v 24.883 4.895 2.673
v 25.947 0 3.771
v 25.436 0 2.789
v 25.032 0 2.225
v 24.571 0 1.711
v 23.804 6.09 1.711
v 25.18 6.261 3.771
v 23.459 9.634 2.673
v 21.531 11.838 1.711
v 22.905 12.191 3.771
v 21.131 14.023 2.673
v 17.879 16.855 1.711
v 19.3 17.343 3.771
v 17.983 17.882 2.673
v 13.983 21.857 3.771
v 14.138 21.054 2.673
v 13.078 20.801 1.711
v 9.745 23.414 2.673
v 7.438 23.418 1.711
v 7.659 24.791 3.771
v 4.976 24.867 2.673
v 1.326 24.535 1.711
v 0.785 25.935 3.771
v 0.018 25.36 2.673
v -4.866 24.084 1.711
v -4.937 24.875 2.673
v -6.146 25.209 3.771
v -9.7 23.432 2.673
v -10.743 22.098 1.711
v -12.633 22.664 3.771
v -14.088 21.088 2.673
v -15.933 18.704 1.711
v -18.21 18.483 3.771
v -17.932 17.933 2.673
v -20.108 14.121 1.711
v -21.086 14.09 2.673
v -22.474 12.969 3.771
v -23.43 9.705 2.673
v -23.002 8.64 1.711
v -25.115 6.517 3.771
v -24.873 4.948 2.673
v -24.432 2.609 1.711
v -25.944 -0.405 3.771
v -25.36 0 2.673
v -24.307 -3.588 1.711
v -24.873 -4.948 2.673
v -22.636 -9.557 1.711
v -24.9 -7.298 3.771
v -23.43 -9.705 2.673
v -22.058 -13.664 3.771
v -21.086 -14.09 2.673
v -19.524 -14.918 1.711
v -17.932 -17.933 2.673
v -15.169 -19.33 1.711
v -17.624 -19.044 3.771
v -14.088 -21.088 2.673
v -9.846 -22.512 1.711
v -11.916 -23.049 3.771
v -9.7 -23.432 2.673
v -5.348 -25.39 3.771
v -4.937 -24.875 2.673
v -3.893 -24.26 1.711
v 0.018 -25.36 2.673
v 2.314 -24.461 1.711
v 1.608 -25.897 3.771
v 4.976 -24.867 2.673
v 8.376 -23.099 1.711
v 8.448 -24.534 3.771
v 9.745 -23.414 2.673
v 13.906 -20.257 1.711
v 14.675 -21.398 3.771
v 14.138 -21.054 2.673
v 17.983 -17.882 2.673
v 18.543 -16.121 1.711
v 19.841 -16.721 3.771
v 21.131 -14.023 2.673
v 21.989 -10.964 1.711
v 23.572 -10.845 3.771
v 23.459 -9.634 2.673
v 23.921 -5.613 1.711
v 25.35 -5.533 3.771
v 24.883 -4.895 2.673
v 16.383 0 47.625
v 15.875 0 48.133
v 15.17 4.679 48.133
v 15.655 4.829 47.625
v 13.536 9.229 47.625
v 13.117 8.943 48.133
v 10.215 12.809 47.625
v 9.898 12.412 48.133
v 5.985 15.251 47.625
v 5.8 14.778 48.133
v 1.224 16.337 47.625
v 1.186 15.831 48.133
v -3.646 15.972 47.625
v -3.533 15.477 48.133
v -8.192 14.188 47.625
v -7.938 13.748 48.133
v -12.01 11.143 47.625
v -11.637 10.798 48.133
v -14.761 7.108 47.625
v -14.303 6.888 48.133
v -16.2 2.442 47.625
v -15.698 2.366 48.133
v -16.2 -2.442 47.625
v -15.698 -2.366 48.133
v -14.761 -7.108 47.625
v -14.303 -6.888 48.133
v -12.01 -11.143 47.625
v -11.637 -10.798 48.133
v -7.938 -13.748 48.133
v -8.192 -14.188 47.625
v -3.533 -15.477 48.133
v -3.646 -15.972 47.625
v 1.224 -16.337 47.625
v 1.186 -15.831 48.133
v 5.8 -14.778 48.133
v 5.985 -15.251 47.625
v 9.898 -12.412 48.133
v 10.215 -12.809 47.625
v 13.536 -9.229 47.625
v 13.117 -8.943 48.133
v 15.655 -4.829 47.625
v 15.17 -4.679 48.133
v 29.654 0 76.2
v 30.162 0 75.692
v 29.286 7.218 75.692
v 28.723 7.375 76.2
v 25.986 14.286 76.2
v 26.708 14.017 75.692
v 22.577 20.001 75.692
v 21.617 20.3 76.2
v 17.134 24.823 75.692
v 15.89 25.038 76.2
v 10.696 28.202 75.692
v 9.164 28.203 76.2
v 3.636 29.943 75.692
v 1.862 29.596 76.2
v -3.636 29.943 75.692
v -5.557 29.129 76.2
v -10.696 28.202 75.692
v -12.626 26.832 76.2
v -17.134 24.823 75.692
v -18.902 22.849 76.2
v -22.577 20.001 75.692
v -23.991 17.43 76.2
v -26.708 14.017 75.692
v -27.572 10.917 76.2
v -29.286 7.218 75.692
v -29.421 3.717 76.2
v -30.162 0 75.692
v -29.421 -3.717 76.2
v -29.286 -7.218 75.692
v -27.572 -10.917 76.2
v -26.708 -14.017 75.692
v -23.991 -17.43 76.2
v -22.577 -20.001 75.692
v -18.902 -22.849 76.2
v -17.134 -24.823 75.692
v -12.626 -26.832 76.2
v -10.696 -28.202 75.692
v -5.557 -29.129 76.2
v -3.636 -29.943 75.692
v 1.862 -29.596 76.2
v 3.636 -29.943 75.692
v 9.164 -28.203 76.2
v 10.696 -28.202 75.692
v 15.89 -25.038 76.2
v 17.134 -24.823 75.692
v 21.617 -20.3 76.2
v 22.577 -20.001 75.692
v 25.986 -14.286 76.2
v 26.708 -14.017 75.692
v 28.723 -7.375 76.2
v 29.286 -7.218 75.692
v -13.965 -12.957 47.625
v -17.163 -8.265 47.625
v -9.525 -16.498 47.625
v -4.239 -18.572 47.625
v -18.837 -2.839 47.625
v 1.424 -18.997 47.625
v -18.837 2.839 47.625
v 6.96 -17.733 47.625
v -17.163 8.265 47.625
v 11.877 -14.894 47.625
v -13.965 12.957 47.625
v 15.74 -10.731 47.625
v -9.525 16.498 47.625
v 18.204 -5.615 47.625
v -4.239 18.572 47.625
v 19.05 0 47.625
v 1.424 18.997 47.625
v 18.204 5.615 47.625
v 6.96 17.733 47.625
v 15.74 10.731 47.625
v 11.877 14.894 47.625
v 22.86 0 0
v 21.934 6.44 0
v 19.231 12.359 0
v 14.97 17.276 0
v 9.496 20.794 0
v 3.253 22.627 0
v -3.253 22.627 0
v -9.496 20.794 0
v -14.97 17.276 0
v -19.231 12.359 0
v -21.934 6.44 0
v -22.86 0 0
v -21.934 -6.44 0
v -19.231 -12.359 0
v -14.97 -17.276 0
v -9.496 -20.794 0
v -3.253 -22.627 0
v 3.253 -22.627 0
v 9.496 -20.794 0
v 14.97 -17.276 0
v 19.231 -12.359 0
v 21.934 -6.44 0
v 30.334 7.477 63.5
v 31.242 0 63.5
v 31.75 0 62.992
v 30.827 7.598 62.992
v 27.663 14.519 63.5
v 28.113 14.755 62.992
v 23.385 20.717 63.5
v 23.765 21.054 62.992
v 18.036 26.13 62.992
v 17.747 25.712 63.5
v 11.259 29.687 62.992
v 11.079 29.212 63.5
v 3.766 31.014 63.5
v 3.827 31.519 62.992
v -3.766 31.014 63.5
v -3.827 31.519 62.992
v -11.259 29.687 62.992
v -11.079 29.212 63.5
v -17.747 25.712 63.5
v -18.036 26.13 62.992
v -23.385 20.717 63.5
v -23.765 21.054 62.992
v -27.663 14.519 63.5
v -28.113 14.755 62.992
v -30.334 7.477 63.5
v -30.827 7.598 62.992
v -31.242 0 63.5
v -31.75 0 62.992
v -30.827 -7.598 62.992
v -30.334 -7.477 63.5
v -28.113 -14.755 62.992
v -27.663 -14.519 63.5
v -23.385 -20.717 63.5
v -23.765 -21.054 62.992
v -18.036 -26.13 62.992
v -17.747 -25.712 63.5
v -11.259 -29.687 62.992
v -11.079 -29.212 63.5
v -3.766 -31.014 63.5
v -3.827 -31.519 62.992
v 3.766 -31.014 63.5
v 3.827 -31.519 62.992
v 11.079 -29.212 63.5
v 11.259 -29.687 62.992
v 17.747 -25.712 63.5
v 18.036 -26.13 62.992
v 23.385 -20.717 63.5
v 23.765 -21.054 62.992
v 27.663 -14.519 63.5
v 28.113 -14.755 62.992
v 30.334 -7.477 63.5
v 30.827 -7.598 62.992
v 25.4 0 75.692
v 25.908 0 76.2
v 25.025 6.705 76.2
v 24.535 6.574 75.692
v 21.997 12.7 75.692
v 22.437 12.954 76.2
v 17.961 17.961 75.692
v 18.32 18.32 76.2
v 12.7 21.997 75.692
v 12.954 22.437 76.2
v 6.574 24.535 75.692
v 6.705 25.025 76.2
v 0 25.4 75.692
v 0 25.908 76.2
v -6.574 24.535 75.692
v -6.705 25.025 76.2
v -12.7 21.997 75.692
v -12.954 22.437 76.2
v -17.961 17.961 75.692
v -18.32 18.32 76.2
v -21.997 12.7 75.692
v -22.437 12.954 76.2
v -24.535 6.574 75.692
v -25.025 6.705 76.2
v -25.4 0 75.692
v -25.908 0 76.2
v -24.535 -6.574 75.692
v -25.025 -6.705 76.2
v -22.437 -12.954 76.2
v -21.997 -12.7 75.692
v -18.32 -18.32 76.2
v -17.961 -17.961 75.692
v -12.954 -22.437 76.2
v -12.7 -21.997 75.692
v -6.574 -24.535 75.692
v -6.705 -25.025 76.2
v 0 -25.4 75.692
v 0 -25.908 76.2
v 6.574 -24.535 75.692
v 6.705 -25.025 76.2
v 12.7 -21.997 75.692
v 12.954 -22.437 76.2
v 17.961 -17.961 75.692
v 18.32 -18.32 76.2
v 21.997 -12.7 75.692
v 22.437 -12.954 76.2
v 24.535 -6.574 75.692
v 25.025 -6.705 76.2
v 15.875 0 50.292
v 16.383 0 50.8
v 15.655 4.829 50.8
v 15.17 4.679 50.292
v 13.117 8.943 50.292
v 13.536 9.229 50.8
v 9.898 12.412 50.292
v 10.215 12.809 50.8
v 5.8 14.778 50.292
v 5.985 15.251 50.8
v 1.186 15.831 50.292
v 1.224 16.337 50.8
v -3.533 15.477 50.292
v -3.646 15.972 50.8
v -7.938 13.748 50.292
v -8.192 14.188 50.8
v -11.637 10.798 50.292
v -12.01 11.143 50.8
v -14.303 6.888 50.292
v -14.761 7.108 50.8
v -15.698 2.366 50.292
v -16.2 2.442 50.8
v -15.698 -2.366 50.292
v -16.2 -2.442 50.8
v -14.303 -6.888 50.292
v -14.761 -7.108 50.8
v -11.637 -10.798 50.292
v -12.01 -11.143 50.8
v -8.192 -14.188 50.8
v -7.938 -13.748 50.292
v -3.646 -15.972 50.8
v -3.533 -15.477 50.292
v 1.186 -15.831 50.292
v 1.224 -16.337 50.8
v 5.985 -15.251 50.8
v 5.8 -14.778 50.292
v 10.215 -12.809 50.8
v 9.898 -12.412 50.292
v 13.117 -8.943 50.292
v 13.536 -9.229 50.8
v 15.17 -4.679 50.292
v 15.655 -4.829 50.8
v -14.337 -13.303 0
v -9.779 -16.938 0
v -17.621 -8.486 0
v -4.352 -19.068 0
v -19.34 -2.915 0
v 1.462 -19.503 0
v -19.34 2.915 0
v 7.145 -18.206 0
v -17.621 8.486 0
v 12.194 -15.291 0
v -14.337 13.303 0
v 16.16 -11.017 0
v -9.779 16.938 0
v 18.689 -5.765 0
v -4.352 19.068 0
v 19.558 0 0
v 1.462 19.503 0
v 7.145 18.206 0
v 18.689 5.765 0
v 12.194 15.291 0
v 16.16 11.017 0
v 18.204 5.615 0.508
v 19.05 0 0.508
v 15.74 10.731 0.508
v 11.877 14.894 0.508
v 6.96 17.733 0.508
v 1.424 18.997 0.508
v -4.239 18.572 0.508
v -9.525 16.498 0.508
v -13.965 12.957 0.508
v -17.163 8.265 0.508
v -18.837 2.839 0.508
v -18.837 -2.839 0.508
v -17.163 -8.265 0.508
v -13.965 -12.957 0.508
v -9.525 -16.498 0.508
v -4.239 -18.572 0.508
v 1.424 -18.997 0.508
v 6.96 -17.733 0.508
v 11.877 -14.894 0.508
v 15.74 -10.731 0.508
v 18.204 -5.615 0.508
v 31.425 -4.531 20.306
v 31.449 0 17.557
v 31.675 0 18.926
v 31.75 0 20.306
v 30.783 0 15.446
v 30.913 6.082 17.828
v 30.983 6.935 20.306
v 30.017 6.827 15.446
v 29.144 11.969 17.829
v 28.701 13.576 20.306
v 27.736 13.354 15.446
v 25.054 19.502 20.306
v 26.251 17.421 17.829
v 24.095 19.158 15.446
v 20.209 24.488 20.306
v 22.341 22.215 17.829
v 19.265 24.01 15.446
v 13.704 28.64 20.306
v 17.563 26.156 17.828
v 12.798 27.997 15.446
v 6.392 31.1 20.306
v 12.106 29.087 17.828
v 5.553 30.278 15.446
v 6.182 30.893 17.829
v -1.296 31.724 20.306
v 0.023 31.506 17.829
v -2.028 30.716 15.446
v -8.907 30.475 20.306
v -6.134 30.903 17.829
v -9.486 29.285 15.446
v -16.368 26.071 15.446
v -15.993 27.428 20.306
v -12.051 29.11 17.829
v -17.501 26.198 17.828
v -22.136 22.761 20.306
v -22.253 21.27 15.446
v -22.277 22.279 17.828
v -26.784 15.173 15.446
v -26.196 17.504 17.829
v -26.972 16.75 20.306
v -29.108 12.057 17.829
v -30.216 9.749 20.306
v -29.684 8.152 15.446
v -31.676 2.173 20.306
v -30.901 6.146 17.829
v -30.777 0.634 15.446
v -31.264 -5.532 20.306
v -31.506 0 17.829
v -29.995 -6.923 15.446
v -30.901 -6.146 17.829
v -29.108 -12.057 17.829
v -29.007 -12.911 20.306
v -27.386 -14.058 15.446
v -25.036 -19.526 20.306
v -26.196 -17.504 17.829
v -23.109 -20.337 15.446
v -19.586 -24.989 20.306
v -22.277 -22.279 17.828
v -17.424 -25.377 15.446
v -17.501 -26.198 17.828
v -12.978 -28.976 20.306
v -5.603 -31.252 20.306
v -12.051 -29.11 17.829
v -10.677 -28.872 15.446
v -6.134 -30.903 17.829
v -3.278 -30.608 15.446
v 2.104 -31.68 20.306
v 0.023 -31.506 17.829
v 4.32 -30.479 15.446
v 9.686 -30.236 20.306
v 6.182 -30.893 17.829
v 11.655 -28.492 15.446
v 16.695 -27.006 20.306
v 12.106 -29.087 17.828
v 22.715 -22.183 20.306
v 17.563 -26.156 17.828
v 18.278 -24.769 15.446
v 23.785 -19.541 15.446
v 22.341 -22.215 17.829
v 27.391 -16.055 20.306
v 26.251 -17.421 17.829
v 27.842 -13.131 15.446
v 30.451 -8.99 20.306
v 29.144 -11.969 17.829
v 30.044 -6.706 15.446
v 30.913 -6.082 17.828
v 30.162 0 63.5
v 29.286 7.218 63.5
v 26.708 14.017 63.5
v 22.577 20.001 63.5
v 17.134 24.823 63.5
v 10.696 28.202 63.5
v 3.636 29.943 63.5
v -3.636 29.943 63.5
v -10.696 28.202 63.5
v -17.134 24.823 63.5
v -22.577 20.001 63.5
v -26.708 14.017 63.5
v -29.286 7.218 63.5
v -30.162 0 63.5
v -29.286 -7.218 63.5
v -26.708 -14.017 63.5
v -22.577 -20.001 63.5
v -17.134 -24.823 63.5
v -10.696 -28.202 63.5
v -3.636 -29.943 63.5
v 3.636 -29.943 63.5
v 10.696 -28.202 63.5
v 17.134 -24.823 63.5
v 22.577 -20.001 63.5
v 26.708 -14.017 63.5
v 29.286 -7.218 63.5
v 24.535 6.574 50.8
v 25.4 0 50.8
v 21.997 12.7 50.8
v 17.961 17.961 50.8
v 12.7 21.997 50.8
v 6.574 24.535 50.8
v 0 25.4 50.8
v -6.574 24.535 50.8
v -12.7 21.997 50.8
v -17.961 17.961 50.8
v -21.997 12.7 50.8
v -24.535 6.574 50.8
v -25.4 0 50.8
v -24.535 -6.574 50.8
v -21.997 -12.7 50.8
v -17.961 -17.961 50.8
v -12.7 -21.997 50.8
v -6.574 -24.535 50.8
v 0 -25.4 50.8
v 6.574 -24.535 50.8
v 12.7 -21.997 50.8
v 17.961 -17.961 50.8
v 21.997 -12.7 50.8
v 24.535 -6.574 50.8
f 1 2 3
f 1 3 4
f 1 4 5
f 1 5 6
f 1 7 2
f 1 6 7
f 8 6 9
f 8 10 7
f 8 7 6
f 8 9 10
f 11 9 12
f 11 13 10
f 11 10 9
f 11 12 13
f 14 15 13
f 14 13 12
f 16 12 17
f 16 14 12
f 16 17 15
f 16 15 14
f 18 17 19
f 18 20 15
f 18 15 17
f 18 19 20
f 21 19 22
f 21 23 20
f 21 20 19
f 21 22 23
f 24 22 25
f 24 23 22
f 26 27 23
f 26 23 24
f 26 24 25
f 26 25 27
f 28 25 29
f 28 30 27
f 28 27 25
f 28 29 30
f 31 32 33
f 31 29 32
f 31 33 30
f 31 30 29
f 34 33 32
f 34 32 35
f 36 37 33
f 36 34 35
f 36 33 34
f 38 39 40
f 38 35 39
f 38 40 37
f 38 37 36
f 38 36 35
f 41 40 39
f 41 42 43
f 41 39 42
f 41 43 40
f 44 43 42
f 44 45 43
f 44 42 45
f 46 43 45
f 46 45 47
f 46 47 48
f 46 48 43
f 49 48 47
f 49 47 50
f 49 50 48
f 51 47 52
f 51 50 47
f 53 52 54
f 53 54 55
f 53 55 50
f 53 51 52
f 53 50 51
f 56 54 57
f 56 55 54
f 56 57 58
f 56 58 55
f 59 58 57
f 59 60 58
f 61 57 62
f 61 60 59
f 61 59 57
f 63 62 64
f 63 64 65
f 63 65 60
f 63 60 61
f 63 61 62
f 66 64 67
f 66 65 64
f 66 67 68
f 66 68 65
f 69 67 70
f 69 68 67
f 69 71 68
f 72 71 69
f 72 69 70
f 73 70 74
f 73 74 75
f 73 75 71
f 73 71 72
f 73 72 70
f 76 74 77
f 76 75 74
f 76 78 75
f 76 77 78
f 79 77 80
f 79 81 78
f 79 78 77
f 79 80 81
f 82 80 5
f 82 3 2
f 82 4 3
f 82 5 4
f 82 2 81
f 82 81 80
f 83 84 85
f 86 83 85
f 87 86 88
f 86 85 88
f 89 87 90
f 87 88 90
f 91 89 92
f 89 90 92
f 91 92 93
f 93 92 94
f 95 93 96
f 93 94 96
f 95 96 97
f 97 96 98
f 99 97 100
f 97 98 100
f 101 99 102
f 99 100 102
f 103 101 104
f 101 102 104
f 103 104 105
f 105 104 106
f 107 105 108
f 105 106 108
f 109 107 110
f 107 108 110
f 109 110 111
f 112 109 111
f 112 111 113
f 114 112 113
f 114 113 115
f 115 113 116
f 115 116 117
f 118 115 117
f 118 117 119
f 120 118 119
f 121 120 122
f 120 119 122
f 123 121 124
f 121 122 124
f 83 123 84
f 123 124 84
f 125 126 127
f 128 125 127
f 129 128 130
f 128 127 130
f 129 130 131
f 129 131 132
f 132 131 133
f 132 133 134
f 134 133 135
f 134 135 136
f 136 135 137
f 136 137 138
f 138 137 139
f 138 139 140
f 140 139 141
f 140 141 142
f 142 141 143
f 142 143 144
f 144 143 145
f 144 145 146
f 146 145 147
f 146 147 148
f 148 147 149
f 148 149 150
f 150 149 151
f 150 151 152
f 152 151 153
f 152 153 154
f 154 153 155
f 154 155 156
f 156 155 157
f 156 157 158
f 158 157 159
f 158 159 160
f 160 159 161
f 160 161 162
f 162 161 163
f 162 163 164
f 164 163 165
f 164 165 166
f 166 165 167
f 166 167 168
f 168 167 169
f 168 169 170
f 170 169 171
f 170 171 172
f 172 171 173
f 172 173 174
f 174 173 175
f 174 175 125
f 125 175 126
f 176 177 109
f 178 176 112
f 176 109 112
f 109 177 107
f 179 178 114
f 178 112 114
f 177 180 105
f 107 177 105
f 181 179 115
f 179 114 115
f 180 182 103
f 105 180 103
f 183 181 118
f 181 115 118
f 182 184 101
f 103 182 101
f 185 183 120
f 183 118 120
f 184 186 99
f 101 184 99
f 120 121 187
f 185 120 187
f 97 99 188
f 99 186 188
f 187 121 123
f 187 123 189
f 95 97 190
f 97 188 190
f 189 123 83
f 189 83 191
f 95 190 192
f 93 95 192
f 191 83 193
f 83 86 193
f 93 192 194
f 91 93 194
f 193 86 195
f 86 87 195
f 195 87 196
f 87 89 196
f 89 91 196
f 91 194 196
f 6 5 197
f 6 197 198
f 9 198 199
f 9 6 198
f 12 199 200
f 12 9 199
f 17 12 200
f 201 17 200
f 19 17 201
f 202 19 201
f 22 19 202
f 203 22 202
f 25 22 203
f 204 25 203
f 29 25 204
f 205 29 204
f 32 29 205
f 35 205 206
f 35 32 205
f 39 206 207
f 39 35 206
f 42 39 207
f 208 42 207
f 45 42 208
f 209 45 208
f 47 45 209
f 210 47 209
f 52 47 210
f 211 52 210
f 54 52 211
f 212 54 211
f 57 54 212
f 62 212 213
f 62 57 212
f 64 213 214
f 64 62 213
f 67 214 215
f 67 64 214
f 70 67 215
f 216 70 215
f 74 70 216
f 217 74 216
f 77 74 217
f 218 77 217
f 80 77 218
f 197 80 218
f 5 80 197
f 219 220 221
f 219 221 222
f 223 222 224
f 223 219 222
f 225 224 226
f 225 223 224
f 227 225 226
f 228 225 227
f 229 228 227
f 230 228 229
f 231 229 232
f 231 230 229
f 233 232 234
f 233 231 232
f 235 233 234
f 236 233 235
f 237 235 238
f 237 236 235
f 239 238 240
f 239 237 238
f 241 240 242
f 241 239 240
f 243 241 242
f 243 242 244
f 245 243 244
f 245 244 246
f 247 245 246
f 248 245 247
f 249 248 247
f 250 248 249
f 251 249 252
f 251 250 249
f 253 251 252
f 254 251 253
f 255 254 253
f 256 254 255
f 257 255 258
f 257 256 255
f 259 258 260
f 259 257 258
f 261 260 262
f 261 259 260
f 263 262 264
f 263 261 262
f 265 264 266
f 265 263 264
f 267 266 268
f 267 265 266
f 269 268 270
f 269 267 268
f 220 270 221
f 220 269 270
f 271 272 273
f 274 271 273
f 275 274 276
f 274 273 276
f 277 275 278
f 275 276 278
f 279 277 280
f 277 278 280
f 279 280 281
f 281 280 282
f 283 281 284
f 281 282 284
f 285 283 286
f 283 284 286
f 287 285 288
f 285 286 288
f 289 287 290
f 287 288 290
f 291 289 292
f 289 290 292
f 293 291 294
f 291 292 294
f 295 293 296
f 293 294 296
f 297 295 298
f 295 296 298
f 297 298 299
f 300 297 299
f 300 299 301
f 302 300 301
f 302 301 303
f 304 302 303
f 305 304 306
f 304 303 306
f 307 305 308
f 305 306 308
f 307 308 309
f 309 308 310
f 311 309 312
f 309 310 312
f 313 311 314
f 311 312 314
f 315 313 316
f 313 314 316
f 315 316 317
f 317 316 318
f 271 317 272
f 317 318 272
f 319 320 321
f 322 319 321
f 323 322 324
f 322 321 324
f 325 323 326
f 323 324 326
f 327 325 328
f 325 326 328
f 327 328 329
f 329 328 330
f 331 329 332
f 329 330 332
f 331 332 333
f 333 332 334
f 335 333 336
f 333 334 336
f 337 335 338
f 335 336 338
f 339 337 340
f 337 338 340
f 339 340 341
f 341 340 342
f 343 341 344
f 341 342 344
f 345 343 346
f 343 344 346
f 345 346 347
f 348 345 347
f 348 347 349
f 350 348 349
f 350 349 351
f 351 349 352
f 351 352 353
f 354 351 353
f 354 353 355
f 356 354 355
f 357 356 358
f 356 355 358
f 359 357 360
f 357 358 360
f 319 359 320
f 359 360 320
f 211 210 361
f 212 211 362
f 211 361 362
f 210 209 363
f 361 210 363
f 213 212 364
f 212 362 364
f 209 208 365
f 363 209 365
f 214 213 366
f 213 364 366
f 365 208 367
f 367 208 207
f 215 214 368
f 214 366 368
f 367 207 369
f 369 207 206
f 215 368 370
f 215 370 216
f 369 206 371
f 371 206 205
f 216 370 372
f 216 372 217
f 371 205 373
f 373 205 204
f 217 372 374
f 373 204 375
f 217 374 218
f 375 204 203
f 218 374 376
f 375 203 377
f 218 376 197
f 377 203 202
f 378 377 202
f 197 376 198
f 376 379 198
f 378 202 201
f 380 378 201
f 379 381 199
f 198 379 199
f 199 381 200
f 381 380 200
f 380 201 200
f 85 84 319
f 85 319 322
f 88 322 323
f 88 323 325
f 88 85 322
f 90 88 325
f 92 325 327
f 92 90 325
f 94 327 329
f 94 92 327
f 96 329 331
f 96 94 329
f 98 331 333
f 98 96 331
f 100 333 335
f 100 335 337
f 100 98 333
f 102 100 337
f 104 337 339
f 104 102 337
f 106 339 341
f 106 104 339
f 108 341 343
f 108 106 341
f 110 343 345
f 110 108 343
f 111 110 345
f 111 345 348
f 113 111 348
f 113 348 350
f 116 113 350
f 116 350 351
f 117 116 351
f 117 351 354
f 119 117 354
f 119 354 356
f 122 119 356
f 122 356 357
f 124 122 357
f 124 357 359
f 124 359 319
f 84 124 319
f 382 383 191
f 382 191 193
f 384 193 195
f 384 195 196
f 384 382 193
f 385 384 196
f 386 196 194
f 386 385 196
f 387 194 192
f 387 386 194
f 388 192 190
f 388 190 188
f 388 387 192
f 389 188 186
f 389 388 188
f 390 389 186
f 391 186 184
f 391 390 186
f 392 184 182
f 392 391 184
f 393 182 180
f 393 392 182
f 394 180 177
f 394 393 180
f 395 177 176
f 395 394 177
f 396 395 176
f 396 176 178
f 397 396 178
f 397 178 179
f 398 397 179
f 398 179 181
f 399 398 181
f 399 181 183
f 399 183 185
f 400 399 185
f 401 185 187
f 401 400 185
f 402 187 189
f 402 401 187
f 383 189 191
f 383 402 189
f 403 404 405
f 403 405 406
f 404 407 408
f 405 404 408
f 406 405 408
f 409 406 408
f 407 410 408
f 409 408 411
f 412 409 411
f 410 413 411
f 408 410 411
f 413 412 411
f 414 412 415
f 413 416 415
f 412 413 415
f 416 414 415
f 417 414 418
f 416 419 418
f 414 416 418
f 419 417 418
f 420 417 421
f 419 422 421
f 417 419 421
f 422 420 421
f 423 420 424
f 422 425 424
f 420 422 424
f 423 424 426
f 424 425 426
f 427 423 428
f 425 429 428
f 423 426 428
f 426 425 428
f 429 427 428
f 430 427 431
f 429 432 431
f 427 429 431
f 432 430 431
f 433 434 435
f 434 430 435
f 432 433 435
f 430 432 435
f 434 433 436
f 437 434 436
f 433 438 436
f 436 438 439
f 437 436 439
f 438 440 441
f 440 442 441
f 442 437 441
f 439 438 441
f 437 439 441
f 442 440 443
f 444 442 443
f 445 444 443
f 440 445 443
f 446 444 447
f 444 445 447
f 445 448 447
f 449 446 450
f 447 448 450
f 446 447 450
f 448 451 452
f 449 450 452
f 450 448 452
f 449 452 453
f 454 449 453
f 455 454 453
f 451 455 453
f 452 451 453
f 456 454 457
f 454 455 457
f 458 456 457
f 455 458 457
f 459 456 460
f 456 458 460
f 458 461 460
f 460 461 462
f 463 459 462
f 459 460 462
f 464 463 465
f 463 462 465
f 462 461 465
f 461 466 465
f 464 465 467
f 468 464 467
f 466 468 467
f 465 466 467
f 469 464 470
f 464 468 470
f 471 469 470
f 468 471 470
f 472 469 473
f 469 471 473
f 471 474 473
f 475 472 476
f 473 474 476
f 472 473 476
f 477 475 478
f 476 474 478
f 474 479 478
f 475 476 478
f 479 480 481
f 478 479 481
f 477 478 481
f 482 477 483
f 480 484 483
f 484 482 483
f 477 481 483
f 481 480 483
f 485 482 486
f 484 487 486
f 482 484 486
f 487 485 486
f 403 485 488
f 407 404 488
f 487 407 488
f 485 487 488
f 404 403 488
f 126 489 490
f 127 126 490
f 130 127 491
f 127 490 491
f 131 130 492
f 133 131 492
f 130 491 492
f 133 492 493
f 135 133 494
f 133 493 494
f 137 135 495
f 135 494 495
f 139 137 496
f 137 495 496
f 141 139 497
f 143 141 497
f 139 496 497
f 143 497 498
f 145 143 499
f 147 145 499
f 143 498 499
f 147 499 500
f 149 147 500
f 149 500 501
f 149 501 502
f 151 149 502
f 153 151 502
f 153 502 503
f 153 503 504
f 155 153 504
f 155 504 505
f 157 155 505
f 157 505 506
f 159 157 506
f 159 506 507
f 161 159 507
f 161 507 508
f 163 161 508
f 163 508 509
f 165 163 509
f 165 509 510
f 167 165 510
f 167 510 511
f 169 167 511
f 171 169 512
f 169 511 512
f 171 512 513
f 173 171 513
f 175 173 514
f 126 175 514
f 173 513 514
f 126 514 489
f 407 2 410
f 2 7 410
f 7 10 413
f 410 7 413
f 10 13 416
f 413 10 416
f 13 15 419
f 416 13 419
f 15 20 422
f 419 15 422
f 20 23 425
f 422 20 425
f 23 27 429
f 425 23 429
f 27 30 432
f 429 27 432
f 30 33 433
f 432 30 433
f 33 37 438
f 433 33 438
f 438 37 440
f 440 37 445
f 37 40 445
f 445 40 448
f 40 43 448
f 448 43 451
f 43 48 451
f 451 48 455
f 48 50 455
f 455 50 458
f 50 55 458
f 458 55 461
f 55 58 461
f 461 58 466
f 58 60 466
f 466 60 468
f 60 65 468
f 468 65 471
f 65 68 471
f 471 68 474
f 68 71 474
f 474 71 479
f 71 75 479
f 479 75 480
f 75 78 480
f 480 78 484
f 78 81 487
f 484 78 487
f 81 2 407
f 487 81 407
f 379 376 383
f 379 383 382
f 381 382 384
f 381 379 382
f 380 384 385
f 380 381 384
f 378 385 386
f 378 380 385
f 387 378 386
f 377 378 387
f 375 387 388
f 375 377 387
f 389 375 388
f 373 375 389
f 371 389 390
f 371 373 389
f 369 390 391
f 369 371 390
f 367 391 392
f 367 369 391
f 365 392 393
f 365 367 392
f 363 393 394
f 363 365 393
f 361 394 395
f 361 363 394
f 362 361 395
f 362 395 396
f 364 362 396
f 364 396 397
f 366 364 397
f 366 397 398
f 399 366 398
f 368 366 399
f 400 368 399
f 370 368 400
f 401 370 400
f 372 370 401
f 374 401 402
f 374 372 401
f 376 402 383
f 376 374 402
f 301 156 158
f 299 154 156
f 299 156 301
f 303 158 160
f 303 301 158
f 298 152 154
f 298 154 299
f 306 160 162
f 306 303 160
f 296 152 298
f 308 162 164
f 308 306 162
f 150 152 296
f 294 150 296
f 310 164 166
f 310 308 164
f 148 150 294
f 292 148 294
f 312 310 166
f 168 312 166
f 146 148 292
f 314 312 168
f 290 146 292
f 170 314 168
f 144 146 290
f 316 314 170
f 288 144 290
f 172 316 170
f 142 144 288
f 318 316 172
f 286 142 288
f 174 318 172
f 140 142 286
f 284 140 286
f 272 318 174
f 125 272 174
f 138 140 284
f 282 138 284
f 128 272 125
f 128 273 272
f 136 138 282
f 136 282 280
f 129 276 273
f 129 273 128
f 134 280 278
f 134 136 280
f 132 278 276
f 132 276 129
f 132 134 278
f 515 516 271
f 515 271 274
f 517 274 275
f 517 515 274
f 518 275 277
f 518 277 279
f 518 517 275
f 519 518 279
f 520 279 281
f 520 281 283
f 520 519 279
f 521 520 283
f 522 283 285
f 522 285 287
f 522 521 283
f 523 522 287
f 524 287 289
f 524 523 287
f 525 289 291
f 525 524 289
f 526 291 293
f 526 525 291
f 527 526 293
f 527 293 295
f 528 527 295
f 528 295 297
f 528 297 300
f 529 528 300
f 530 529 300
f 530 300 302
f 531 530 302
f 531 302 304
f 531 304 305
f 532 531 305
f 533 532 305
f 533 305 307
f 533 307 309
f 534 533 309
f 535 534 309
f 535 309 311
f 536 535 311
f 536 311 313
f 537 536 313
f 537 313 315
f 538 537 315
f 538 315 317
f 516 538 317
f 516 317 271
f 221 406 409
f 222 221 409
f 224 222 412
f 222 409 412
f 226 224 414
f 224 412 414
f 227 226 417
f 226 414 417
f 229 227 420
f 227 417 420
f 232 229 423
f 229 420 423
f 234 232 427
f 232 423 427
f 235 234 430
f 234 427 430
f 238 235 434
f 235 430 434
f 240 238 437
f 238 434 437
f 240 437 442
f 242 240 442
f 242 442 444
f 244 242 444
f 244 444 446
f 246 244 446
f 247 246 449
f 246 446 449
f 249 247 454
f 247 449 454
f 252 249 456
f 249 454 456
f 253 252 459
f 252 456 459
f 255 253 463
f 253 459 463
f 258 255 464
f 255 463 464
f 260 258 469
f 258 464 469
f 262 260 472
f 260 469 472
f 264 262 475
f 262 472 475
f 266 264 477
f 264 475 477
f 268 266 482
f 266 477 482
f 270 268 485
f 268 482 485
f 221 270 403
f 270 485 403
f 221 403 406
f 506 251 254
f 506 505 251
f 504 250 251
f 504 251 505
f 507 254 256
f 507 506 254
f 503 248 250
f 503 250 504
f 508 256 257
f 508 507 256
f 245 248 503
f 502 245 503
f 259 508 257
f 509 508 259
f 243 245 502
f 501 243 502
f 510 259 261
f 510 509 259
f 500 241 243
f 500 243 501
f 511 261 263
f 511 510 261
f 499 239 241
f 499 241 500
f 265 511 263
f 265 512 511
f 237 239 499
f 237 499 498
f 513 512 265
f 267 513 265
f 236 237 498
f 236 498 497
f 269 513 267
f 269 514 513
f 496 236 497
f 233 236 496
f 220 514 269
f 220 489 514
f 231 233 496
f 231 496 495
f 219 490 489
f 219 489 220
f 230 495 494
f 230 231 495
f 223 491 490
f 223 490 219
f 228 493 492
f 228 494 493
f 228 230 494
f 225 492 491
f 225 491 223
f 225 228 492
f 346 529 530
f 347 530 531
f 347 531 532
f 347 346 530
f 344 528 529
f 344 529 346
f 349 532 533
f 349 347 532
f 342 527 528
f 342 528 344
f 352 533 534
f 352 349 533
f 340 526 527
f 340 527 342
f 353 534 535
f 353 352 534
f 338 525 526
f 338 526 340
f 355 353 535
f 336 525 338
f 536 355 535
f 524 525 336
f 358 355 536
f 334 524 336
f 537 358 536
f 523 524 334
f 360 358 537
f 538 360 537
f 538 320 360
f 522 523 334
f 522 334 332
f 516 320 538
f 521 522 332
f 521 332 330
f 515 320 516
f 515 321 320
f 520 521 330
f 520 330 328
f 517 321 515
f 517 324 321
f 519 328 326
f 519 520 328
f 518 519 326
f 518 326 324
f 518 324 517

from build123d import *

# Parameters (mm, degrees)
F0_R     = 31.75
F0_R_2   = 30.1625
F1_DEPTH = 63.5
F0_R_3   = 25.4
F2_DEPTH = 76.2
F0_R_4   = 19.05
F3_DEPTH = 50.8
F0_R_5   = 15.875
F4_DEPTH = 50.8
F5_DEPTH = 47.625
F8_SIZE  = 0.508
F9_SIZE  = 0.508
F10_SIZE = 8.89
F11_SIZE = 8.89
F13_R    = 12.7
F14_R    = 6.35


with BuildPart() as f1:
    # F0 (on Top) → F1 (new body)
    with BuildSketch(Plane.XY):
        Circle(F0_R)
        Circle(F0_R_2, mode=Mode.SUBTRACT)
    extrude(amount=F1_DEPTH)

    # F0 (on Top) → F2 (join)
    with BuildSketch(Plane.XY):
        Circle(F0_R_2)
        Circle(F0_R_3, mode=Mode.SUBTRACT)
    extrude(amount=F2_DEPTH)

    # F0 (on Top) → F3 (join)
    with BuildSketch(Plane.XY):
        Circle(F0_R_3)
        Circle(F0_R_4, mode=Mode.SUBTRACT)
    extrude(amount=F3_DEPTH)

    # F0 (on Top) → F4 (join)
    with BuildSketch(Plane.XY):
        Circle(F0_R_4)
        Circle(F0_R_5, mode=Mode.SUBTRACT)
    extrude(amount=F4_DEPTH)

    # F0 (on Top) → F5 (cut)
    with BuildSketch(Plane.XY):
        Circle(F0_R_4)
        Circle(F0_R_5, mode=Mode.SUBTRACT)
    extrude(amount=F5_DEPTH, mode=Mode.SUBTRACT)

    # F8
    f8_edges = [f1.edges().sort_by_distance(p)[0] for p in [
        (-19.05, 0, 0),
        (-31.75, 0, 63.5),
        (-30.1625, 0, 76.2),
        (-25.4, 0, 76.2),
    ]]
    chamfer(f8_edges, length=F8_SIZE)

    # F9
    f9_edges = [f1.edges().sort_by_distance(p)[0] for p in [
        (-15.875, 0, 50.8),
        (-15.875, 0, 47.625),
    ]]
    chamfer(f9_edges, length=F9_SIZE)

    # F10
    f10_edges = [f1.edges().sort_by_distance(p)[0] for p in [
        (-31.75, 0, 0),
    ]]
    chamfer(f10_edges, length=F10_SIZE)

    # F11
    f11_edges = [f1.edges().sort_by_distance(p)[0] for p in [
        (-31.75, 0, 8.89),
    ]]
    chamfer(f11_edges, length=F11_SIZE)

    # F13
    f13_edges = [f1.edges().sort_by_distance(p)[0] for p in [
        (-31.749992, 0, 17.78),
    ]]
    fillet(f13_edges, radius=F13_R)

    # F14
    f14_edges = [f1.edges().sort_by_distance(p)[0] for p in [
        (-25.463814, 0, 2.603821),
    ]]
    fillet(f14_edges, radius=F14_R)


solid = f1.part
